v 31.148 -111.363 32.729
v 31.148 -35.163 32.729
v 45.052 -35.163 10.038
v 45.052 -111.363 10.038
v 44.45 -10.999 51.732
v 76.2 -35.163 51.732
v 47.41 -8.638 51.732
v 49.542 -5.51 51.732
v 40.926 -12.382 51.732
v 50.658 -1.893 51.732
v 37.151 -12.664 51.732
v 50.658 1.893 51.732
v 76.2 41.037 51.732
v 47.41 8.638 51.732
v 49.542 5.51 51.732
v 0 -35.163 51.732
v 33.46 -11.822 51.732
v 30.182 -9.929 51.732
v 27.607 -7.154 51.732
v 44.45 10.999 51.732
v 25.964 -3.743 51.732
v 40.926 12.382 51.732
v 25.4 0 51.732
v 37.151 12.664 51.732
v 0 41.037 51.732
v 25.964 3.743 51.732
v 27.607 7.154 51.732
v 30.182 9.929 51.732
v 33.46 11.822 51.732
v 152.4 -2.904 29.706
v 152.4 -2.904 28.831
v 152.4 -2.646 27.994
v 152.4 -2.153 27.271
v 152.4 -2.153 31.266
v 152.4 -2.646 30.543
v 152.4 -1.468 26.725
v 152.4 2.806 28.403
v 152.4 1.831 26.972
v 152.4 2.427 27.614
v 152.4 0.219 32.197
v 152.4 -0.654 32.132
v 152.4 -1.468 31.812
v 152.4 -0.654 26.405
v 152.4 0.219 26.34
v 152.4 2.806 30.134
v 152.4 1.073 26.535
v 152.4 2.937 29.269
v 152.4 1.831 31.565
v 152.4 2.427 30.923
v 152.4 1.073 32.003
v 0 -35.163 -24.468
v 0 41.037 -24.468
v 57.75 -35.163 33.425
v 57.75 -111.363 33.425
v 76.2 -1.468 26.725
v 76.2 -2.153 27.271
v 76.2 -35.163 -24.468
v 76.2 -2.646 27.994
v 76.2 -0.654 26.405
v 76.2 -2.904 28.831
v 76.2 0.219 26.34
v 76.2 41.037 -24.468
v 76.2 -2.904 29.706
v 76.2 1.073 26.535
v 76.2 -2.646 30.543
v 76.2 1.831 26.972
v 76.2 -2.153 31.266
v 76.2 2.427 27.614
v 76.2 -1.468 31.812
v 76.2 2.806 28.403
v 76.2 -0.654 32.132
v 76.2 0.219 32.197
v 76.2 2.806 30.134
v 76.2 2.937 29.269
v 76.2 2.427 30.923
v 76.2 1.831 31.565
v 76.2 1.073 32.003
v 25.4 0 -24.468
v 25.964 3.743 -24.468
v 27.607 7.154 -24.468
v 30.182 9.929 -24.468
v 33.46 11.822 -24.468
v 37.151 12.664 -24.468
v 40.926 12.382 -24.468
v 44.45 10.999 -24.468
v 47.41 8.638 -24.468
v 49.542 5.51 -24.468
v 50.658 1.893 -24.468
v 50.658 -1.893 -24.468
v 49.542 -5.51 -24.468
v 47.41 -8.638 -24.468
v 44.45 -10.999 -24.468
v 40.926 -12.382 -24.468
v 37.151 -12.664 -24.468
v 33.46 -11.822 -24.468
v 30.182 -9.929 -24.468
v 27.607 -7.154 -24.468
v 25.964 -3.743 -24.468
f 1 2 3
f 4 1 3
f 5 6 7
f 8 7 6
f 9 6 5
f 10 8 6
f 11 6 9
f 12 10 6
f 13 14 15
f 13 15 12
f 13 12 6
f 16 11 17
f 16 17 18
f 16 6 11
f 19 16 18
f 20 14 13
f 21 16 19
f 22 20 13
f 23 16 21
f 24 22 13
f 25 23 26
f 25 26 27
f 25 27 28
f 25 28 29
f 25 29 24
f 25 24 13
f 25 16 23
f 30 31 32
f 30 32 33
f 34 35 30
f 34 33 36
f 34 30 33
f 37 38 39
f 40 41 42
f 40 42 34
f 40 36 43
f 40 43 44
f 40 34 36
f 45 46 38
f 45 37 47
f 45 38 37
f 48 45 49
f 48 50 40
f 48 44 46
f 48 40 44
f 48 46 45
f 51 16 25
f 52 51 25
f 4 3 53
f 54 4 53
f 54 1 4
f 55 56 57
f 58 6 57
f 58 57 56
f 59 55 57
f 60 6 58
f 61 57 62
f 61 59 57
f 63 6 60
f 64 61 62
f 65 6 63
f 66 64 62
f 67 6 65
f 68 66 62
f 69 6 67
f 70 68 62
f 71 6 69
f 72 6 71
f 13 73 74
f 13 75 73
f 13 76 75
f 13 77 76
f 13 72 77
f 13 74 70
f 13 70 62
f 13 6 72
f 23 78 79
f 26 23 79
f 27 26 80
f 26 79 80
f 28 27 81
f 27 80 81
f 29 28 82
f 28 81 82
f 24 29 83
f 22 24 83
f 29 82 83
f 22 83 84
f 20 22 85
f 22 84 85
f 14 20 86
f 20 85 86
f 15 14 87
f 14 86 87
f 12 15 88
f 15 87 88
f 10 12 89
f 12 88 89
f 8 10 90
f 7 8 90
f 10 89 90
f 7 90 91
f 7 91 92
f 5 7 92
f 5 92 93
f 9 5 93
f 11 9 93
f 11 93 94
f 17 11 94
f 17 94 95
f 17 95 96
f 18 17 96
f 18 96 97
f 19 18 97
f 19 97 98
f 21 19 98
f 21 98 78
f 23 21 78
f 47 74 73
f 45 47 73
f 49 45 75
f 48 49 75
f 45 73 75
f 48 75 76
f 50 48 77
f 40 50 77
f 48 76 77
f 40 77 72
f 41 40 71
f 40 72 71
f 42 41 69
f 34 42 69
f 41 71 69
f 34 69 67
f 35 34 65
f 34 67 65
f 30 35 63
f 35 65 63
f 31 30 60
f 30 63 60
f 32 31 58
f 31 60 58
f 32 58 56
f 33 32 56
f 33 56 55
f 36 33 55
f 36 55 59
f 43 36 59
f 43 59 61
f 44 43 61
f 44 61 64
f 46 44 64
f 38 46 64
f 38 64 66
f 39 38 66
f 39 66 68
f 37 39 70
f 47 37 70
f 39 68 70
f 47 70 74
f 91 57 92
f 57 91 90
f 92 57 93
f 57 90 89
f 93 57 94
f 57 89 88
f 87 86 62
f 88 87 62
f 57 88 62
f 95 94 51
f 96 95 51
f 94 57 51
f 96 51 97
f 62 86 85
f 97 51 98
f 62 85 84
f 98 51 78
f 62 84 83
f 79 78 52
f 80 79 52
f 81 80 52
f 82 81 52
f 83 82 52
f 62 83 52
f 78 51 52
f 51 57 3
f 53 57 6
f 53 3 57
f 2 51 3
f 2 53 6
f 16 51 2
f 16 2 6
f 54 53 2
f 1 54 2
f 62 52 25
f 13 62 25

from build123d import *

# Parameters (mm, degrees)
F0_W     = 76.2
F0_H     = 76.2
F1_DEPTH = 76.2
F3_D     = 25.4
F5_DEPTH = 76.2
F6_R     = 2.936929
F7_DEPTH = 76.2


with BuildPart() as f1:
    # F0 (on Right) → F1 (new body)
    with BuildSketch(Plane.YZ):
        with Locations((2.936929, 13.631745)):
            Rectangle(F0_W, F0_H)
    extrude(amount=F1_DEPTH)

    # F3 (through all)
    with Locations(Plane.XY.offset(51.731745)):
        with Locations((38.1, 0)):
            Hole(F3_D / 2)

    # F4 (on face) → F5 (join)
    with BuildSketch(Plane.XZ.offset(35.163071)):
        Polygon((31.147685, 32.728756), (45.052315, 10.038463), (57.75037, 33.425371), align=None)
    extrude(amount=F5_DEPTH)

    # F6 (on face) → F7 (join)
    with BuildSketch(Plane.YZ.offset(76.2)):
        with Locations((0, 29.268674)):
            Circle(F6_R)
    extrude(amount=F7_DEPTH)


solid = f1.part
